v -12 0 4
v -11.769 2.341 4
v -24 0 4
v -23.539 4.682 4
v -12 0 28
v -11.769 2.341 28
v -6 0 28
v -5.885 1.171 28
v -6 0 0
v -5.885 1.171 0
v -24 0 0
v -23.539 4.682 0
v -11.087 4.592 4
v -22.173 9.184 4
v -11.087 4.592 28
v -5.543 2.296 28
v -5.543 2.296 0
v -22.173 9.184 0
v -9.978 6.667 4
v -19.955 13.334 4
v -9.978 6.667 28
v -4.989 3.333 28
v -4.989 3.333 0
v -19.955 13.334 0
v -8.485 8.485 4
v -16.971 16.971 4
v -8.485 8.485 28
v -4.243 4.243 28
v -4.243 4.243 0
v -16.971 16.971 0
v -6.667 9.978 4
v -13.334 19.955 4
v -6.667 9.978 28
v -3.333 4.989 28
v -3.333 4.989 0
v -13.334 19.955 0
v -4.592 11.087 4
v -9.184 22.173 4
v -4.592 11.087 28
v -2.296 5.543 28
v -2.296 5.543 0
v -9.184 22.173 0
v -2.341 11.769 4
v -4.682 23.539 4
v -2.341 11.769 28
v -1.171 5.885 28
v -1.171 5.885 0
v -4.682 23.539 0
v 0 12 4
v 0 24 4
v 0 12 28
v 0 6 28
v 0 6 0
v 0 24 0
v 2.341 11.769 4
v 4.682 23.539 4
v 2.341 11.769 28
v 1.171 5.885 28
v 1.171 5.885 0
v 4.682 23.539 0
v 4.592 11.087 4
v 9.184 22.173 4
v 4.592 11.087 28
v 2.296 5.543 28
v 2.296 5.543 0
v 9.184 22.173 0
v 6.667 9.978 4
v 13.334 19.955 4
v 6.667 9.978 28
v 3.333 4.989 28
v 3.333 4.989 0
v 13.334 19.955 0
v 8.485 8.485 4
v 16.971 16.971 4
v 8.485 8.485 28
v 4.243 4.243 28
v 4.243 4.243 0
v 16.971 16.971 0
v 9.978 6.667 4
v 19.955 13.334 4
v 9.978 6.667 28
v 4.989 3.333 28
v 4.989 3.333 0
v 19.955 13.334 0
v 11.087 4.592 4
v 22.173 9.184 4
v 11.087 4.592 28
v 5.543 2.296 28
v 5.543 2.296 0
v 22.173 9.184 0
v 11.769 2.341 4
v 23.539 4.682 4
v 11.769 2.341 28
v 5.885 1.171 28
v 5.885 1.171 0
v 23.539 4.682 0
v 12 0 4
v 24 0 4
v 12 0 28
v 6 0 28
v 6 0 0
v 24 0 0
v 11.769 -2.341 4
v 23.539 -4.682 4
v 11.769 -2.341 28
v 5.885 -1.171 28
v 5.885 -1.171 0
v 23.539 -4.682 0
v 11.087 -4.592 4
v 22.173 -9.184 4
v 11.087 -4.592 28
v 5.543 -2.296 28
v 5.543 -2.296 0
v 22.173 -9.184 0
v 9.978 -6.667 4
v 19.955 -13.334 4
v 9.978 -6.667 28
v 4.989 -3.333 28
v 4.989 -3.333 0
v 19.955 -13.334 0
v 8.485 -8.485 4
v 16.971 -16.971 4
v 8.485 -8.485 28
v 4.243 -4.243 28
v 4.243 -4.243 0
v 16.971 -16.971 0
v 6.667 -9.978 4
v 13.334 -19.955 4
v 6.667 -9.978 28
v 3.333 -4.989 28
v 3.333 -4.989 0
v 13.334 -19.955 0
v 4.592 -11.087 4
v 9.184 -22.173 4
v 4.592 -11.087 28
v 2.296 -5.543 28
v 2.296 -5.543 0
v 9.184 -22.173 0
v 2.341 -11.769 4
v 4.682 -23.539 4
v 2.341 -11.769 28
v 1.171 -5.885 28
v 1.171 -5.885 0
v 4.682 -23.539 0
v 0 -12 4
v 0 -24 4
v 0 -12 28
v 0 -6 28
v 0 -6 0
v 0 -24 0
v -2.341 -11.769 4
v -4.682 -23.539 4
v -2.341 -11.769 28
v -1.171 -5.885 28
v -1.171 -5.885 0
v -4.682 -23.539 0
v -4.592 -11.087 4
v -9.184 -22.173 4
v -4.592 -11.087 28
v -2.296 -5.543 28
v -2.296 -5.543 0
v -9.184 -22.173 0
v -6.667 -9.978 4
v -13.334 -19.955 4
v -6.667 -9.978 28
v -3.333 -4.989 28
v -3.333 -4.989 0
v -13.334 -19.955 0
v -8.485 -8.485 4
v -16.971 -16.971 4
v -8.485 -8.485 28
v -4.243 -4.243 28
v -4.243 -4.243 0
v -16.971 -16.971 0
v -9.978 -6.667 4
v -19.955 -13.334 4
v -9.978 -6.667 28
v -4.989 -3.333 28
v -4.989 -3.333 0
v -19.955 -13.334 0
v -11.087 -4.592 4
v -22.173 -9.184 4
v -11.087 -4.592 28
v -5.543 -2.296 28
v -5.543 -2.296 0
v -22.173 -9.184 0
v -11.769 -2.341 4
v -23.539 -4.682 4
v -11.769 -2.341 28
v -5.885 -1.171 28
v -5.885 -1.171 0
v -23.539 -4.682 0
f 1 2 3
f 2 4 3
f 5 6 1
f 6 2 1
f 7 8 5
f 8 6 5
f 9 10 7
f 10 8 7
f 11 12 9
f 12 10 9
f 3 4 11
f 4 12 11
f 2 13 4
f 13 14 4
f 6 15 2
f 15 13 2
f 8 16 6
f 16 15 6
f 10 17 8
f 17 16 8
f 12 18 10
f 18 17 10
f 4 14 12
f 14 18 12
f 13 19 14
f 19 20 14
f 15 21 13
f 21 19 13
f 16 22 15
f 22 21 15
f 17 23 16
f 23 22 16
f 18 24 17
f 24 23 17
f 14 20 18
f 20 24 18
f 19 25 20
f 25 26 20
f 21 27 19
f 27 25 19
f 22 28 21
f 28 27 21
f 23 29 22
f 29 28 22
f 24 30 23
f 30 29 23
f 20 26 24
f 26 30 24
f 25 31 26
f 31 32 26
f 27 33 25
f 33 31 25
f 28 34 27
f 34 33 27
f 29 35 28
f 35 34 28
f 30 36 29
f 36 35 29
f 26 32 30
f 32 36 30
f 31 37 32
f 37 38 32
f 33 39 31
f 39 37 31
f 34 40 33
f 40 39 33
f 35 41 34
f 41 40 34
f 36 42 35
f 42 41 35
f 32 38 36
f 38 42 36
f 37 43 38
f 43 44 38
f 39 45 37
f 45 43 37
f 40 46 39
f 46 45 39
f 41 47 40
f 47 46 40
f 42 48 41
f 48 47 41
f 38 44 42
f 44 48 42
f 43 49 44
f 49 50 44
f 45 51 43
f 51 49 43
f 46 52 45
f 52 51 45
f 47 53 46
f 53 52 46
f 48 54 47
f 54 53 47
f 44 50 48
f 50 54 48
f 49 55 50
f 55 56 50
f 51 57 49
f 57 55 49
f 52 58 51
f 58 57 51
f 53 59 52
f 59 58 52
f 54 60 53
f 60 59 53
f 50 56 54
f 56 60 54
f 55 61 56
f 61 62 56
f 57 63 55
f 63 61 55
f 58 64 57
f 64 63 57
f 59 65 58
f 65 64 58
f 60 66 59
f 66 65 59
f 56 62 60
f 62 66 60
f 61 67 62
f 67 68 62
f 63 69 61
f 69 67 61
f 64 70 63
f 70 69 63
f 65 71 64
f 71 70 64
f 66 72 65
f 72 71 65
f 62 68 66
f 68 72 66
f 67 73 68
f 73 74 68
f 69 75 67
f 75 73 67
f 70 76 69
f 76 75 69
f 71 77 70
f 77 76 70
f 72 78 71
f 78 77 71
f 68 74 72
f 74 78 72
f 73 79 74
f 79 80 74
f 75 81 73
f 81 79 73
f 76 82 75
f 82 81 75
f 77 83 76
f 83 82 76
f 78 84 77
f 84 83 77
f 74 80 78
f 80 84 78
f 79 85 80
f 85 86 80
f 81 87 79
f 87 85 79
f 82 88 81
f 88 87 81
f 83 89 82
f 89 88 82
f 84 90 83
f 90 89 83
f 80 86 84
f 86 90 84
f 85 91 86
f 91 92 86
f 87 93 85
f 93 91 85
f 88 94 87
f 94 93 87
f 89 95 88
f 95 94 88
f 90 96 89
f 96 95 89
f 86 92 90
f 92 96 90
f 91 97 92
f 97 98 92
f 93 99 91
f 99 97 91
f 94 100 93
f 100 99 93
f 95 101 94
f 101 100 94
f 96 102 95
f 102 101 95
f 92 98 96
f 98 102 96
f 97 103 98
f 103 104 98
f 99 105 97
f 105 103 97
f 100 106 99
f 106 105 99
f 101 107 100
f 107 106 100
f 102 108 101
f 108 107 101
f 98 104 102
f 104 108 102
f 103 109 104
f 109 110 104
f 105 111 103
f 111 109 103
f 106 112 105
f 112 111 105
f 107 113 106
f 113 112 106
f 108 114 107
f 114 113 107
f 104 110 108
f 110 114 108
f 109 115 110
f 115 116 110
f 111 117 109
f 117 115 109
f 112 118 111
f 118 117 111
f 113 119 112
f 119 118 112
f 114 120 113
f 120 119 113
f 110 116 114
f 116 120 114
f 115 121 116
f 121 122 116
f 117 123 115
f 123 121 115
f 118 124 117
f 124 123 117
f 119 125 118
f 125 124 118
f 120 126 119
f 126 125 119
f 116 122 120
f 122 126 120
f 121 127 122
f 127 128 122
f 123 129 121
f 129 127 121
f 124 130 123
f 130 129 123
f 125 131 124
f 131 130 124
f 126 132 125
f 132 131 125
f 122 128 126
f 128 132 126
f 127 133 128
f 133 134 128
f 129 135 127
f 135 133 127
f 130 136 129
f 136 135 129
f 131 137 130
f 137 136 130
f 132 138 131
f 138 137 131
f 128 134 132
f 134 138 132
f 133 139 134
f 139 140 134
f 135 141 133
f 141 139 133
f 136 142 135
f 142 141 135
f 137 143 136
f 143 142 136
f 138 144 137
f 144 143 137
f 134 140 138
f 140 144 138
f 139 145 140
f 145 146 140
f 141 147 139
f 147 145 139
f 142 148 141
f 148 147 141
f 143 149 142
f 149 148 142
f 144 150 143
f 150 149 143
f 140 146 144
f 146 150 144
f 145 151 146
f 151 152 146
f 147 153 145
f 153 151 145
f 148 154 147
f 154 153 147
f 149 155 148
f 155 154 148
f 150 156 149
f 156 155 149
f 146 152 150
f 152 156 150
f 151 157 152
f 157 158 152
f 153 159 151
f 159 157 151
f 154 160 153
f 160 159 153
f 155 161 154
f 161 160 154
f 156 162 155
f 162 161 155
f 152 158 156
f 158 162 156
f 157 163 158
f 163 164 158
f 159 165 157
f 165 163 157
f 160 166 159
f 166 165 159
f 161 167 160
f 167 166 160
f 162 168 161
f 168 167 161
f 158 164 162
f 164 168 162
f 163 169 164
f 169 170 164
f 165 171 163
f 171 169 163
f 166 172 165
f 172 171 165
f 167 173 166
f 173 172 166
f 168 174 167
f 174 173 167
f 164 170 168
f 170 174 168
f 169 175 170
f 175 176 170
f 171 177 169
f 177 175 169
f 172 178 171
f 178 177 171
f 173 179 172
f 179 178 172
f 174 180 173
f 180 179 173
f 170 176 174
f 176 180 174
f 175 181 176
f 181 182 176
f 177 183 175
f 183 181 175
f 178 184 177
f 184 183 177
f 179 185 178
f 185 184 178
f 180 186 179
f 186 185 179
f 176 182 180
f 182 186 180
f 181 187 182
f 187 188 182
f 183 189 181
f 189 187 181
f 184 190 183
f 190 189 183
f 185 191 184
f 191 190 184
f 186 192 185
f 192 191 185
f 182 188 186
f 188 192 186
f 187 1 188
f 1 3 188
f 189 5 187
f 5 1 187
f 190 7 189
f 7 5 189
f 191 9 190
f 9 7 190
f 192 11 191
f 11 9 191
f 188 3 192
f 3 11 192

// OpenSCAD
$fn = 32;

// ----------------------------------------------------------------------
// Revolved part: flanged bushing R24
// ----------------------------------------------------------------------

// --- parameters (mm) ---
bore_r = 6;               // bore radius
flange_r = 24;            // flange radius
flange_h = 4;             // flange thickness
sleeve_r = 12;            // sleeve radius
total_h = 28;             // overall height
revolve_angle = 360;      // revolve sweep, degrees
fit_tol = 0.1;            // declared fit tolerance (prompt contract)
free_tol = 0.3;           // declared free tolerance (prompt contract)

bore_d = 2 * bore_r;
flange_d = 2 * flange_r;
sleeve_d = 2 * sleeve_r;

profile = [[6, 0], [24, 0], [24, 4], [12, 4], [12, 28], [6, 28]];  // primary outline, 6 points, counter clockwise

// --- the one profile operation ---
rotate_extrude(angle = revolve_angle) polygon(points = profile);
